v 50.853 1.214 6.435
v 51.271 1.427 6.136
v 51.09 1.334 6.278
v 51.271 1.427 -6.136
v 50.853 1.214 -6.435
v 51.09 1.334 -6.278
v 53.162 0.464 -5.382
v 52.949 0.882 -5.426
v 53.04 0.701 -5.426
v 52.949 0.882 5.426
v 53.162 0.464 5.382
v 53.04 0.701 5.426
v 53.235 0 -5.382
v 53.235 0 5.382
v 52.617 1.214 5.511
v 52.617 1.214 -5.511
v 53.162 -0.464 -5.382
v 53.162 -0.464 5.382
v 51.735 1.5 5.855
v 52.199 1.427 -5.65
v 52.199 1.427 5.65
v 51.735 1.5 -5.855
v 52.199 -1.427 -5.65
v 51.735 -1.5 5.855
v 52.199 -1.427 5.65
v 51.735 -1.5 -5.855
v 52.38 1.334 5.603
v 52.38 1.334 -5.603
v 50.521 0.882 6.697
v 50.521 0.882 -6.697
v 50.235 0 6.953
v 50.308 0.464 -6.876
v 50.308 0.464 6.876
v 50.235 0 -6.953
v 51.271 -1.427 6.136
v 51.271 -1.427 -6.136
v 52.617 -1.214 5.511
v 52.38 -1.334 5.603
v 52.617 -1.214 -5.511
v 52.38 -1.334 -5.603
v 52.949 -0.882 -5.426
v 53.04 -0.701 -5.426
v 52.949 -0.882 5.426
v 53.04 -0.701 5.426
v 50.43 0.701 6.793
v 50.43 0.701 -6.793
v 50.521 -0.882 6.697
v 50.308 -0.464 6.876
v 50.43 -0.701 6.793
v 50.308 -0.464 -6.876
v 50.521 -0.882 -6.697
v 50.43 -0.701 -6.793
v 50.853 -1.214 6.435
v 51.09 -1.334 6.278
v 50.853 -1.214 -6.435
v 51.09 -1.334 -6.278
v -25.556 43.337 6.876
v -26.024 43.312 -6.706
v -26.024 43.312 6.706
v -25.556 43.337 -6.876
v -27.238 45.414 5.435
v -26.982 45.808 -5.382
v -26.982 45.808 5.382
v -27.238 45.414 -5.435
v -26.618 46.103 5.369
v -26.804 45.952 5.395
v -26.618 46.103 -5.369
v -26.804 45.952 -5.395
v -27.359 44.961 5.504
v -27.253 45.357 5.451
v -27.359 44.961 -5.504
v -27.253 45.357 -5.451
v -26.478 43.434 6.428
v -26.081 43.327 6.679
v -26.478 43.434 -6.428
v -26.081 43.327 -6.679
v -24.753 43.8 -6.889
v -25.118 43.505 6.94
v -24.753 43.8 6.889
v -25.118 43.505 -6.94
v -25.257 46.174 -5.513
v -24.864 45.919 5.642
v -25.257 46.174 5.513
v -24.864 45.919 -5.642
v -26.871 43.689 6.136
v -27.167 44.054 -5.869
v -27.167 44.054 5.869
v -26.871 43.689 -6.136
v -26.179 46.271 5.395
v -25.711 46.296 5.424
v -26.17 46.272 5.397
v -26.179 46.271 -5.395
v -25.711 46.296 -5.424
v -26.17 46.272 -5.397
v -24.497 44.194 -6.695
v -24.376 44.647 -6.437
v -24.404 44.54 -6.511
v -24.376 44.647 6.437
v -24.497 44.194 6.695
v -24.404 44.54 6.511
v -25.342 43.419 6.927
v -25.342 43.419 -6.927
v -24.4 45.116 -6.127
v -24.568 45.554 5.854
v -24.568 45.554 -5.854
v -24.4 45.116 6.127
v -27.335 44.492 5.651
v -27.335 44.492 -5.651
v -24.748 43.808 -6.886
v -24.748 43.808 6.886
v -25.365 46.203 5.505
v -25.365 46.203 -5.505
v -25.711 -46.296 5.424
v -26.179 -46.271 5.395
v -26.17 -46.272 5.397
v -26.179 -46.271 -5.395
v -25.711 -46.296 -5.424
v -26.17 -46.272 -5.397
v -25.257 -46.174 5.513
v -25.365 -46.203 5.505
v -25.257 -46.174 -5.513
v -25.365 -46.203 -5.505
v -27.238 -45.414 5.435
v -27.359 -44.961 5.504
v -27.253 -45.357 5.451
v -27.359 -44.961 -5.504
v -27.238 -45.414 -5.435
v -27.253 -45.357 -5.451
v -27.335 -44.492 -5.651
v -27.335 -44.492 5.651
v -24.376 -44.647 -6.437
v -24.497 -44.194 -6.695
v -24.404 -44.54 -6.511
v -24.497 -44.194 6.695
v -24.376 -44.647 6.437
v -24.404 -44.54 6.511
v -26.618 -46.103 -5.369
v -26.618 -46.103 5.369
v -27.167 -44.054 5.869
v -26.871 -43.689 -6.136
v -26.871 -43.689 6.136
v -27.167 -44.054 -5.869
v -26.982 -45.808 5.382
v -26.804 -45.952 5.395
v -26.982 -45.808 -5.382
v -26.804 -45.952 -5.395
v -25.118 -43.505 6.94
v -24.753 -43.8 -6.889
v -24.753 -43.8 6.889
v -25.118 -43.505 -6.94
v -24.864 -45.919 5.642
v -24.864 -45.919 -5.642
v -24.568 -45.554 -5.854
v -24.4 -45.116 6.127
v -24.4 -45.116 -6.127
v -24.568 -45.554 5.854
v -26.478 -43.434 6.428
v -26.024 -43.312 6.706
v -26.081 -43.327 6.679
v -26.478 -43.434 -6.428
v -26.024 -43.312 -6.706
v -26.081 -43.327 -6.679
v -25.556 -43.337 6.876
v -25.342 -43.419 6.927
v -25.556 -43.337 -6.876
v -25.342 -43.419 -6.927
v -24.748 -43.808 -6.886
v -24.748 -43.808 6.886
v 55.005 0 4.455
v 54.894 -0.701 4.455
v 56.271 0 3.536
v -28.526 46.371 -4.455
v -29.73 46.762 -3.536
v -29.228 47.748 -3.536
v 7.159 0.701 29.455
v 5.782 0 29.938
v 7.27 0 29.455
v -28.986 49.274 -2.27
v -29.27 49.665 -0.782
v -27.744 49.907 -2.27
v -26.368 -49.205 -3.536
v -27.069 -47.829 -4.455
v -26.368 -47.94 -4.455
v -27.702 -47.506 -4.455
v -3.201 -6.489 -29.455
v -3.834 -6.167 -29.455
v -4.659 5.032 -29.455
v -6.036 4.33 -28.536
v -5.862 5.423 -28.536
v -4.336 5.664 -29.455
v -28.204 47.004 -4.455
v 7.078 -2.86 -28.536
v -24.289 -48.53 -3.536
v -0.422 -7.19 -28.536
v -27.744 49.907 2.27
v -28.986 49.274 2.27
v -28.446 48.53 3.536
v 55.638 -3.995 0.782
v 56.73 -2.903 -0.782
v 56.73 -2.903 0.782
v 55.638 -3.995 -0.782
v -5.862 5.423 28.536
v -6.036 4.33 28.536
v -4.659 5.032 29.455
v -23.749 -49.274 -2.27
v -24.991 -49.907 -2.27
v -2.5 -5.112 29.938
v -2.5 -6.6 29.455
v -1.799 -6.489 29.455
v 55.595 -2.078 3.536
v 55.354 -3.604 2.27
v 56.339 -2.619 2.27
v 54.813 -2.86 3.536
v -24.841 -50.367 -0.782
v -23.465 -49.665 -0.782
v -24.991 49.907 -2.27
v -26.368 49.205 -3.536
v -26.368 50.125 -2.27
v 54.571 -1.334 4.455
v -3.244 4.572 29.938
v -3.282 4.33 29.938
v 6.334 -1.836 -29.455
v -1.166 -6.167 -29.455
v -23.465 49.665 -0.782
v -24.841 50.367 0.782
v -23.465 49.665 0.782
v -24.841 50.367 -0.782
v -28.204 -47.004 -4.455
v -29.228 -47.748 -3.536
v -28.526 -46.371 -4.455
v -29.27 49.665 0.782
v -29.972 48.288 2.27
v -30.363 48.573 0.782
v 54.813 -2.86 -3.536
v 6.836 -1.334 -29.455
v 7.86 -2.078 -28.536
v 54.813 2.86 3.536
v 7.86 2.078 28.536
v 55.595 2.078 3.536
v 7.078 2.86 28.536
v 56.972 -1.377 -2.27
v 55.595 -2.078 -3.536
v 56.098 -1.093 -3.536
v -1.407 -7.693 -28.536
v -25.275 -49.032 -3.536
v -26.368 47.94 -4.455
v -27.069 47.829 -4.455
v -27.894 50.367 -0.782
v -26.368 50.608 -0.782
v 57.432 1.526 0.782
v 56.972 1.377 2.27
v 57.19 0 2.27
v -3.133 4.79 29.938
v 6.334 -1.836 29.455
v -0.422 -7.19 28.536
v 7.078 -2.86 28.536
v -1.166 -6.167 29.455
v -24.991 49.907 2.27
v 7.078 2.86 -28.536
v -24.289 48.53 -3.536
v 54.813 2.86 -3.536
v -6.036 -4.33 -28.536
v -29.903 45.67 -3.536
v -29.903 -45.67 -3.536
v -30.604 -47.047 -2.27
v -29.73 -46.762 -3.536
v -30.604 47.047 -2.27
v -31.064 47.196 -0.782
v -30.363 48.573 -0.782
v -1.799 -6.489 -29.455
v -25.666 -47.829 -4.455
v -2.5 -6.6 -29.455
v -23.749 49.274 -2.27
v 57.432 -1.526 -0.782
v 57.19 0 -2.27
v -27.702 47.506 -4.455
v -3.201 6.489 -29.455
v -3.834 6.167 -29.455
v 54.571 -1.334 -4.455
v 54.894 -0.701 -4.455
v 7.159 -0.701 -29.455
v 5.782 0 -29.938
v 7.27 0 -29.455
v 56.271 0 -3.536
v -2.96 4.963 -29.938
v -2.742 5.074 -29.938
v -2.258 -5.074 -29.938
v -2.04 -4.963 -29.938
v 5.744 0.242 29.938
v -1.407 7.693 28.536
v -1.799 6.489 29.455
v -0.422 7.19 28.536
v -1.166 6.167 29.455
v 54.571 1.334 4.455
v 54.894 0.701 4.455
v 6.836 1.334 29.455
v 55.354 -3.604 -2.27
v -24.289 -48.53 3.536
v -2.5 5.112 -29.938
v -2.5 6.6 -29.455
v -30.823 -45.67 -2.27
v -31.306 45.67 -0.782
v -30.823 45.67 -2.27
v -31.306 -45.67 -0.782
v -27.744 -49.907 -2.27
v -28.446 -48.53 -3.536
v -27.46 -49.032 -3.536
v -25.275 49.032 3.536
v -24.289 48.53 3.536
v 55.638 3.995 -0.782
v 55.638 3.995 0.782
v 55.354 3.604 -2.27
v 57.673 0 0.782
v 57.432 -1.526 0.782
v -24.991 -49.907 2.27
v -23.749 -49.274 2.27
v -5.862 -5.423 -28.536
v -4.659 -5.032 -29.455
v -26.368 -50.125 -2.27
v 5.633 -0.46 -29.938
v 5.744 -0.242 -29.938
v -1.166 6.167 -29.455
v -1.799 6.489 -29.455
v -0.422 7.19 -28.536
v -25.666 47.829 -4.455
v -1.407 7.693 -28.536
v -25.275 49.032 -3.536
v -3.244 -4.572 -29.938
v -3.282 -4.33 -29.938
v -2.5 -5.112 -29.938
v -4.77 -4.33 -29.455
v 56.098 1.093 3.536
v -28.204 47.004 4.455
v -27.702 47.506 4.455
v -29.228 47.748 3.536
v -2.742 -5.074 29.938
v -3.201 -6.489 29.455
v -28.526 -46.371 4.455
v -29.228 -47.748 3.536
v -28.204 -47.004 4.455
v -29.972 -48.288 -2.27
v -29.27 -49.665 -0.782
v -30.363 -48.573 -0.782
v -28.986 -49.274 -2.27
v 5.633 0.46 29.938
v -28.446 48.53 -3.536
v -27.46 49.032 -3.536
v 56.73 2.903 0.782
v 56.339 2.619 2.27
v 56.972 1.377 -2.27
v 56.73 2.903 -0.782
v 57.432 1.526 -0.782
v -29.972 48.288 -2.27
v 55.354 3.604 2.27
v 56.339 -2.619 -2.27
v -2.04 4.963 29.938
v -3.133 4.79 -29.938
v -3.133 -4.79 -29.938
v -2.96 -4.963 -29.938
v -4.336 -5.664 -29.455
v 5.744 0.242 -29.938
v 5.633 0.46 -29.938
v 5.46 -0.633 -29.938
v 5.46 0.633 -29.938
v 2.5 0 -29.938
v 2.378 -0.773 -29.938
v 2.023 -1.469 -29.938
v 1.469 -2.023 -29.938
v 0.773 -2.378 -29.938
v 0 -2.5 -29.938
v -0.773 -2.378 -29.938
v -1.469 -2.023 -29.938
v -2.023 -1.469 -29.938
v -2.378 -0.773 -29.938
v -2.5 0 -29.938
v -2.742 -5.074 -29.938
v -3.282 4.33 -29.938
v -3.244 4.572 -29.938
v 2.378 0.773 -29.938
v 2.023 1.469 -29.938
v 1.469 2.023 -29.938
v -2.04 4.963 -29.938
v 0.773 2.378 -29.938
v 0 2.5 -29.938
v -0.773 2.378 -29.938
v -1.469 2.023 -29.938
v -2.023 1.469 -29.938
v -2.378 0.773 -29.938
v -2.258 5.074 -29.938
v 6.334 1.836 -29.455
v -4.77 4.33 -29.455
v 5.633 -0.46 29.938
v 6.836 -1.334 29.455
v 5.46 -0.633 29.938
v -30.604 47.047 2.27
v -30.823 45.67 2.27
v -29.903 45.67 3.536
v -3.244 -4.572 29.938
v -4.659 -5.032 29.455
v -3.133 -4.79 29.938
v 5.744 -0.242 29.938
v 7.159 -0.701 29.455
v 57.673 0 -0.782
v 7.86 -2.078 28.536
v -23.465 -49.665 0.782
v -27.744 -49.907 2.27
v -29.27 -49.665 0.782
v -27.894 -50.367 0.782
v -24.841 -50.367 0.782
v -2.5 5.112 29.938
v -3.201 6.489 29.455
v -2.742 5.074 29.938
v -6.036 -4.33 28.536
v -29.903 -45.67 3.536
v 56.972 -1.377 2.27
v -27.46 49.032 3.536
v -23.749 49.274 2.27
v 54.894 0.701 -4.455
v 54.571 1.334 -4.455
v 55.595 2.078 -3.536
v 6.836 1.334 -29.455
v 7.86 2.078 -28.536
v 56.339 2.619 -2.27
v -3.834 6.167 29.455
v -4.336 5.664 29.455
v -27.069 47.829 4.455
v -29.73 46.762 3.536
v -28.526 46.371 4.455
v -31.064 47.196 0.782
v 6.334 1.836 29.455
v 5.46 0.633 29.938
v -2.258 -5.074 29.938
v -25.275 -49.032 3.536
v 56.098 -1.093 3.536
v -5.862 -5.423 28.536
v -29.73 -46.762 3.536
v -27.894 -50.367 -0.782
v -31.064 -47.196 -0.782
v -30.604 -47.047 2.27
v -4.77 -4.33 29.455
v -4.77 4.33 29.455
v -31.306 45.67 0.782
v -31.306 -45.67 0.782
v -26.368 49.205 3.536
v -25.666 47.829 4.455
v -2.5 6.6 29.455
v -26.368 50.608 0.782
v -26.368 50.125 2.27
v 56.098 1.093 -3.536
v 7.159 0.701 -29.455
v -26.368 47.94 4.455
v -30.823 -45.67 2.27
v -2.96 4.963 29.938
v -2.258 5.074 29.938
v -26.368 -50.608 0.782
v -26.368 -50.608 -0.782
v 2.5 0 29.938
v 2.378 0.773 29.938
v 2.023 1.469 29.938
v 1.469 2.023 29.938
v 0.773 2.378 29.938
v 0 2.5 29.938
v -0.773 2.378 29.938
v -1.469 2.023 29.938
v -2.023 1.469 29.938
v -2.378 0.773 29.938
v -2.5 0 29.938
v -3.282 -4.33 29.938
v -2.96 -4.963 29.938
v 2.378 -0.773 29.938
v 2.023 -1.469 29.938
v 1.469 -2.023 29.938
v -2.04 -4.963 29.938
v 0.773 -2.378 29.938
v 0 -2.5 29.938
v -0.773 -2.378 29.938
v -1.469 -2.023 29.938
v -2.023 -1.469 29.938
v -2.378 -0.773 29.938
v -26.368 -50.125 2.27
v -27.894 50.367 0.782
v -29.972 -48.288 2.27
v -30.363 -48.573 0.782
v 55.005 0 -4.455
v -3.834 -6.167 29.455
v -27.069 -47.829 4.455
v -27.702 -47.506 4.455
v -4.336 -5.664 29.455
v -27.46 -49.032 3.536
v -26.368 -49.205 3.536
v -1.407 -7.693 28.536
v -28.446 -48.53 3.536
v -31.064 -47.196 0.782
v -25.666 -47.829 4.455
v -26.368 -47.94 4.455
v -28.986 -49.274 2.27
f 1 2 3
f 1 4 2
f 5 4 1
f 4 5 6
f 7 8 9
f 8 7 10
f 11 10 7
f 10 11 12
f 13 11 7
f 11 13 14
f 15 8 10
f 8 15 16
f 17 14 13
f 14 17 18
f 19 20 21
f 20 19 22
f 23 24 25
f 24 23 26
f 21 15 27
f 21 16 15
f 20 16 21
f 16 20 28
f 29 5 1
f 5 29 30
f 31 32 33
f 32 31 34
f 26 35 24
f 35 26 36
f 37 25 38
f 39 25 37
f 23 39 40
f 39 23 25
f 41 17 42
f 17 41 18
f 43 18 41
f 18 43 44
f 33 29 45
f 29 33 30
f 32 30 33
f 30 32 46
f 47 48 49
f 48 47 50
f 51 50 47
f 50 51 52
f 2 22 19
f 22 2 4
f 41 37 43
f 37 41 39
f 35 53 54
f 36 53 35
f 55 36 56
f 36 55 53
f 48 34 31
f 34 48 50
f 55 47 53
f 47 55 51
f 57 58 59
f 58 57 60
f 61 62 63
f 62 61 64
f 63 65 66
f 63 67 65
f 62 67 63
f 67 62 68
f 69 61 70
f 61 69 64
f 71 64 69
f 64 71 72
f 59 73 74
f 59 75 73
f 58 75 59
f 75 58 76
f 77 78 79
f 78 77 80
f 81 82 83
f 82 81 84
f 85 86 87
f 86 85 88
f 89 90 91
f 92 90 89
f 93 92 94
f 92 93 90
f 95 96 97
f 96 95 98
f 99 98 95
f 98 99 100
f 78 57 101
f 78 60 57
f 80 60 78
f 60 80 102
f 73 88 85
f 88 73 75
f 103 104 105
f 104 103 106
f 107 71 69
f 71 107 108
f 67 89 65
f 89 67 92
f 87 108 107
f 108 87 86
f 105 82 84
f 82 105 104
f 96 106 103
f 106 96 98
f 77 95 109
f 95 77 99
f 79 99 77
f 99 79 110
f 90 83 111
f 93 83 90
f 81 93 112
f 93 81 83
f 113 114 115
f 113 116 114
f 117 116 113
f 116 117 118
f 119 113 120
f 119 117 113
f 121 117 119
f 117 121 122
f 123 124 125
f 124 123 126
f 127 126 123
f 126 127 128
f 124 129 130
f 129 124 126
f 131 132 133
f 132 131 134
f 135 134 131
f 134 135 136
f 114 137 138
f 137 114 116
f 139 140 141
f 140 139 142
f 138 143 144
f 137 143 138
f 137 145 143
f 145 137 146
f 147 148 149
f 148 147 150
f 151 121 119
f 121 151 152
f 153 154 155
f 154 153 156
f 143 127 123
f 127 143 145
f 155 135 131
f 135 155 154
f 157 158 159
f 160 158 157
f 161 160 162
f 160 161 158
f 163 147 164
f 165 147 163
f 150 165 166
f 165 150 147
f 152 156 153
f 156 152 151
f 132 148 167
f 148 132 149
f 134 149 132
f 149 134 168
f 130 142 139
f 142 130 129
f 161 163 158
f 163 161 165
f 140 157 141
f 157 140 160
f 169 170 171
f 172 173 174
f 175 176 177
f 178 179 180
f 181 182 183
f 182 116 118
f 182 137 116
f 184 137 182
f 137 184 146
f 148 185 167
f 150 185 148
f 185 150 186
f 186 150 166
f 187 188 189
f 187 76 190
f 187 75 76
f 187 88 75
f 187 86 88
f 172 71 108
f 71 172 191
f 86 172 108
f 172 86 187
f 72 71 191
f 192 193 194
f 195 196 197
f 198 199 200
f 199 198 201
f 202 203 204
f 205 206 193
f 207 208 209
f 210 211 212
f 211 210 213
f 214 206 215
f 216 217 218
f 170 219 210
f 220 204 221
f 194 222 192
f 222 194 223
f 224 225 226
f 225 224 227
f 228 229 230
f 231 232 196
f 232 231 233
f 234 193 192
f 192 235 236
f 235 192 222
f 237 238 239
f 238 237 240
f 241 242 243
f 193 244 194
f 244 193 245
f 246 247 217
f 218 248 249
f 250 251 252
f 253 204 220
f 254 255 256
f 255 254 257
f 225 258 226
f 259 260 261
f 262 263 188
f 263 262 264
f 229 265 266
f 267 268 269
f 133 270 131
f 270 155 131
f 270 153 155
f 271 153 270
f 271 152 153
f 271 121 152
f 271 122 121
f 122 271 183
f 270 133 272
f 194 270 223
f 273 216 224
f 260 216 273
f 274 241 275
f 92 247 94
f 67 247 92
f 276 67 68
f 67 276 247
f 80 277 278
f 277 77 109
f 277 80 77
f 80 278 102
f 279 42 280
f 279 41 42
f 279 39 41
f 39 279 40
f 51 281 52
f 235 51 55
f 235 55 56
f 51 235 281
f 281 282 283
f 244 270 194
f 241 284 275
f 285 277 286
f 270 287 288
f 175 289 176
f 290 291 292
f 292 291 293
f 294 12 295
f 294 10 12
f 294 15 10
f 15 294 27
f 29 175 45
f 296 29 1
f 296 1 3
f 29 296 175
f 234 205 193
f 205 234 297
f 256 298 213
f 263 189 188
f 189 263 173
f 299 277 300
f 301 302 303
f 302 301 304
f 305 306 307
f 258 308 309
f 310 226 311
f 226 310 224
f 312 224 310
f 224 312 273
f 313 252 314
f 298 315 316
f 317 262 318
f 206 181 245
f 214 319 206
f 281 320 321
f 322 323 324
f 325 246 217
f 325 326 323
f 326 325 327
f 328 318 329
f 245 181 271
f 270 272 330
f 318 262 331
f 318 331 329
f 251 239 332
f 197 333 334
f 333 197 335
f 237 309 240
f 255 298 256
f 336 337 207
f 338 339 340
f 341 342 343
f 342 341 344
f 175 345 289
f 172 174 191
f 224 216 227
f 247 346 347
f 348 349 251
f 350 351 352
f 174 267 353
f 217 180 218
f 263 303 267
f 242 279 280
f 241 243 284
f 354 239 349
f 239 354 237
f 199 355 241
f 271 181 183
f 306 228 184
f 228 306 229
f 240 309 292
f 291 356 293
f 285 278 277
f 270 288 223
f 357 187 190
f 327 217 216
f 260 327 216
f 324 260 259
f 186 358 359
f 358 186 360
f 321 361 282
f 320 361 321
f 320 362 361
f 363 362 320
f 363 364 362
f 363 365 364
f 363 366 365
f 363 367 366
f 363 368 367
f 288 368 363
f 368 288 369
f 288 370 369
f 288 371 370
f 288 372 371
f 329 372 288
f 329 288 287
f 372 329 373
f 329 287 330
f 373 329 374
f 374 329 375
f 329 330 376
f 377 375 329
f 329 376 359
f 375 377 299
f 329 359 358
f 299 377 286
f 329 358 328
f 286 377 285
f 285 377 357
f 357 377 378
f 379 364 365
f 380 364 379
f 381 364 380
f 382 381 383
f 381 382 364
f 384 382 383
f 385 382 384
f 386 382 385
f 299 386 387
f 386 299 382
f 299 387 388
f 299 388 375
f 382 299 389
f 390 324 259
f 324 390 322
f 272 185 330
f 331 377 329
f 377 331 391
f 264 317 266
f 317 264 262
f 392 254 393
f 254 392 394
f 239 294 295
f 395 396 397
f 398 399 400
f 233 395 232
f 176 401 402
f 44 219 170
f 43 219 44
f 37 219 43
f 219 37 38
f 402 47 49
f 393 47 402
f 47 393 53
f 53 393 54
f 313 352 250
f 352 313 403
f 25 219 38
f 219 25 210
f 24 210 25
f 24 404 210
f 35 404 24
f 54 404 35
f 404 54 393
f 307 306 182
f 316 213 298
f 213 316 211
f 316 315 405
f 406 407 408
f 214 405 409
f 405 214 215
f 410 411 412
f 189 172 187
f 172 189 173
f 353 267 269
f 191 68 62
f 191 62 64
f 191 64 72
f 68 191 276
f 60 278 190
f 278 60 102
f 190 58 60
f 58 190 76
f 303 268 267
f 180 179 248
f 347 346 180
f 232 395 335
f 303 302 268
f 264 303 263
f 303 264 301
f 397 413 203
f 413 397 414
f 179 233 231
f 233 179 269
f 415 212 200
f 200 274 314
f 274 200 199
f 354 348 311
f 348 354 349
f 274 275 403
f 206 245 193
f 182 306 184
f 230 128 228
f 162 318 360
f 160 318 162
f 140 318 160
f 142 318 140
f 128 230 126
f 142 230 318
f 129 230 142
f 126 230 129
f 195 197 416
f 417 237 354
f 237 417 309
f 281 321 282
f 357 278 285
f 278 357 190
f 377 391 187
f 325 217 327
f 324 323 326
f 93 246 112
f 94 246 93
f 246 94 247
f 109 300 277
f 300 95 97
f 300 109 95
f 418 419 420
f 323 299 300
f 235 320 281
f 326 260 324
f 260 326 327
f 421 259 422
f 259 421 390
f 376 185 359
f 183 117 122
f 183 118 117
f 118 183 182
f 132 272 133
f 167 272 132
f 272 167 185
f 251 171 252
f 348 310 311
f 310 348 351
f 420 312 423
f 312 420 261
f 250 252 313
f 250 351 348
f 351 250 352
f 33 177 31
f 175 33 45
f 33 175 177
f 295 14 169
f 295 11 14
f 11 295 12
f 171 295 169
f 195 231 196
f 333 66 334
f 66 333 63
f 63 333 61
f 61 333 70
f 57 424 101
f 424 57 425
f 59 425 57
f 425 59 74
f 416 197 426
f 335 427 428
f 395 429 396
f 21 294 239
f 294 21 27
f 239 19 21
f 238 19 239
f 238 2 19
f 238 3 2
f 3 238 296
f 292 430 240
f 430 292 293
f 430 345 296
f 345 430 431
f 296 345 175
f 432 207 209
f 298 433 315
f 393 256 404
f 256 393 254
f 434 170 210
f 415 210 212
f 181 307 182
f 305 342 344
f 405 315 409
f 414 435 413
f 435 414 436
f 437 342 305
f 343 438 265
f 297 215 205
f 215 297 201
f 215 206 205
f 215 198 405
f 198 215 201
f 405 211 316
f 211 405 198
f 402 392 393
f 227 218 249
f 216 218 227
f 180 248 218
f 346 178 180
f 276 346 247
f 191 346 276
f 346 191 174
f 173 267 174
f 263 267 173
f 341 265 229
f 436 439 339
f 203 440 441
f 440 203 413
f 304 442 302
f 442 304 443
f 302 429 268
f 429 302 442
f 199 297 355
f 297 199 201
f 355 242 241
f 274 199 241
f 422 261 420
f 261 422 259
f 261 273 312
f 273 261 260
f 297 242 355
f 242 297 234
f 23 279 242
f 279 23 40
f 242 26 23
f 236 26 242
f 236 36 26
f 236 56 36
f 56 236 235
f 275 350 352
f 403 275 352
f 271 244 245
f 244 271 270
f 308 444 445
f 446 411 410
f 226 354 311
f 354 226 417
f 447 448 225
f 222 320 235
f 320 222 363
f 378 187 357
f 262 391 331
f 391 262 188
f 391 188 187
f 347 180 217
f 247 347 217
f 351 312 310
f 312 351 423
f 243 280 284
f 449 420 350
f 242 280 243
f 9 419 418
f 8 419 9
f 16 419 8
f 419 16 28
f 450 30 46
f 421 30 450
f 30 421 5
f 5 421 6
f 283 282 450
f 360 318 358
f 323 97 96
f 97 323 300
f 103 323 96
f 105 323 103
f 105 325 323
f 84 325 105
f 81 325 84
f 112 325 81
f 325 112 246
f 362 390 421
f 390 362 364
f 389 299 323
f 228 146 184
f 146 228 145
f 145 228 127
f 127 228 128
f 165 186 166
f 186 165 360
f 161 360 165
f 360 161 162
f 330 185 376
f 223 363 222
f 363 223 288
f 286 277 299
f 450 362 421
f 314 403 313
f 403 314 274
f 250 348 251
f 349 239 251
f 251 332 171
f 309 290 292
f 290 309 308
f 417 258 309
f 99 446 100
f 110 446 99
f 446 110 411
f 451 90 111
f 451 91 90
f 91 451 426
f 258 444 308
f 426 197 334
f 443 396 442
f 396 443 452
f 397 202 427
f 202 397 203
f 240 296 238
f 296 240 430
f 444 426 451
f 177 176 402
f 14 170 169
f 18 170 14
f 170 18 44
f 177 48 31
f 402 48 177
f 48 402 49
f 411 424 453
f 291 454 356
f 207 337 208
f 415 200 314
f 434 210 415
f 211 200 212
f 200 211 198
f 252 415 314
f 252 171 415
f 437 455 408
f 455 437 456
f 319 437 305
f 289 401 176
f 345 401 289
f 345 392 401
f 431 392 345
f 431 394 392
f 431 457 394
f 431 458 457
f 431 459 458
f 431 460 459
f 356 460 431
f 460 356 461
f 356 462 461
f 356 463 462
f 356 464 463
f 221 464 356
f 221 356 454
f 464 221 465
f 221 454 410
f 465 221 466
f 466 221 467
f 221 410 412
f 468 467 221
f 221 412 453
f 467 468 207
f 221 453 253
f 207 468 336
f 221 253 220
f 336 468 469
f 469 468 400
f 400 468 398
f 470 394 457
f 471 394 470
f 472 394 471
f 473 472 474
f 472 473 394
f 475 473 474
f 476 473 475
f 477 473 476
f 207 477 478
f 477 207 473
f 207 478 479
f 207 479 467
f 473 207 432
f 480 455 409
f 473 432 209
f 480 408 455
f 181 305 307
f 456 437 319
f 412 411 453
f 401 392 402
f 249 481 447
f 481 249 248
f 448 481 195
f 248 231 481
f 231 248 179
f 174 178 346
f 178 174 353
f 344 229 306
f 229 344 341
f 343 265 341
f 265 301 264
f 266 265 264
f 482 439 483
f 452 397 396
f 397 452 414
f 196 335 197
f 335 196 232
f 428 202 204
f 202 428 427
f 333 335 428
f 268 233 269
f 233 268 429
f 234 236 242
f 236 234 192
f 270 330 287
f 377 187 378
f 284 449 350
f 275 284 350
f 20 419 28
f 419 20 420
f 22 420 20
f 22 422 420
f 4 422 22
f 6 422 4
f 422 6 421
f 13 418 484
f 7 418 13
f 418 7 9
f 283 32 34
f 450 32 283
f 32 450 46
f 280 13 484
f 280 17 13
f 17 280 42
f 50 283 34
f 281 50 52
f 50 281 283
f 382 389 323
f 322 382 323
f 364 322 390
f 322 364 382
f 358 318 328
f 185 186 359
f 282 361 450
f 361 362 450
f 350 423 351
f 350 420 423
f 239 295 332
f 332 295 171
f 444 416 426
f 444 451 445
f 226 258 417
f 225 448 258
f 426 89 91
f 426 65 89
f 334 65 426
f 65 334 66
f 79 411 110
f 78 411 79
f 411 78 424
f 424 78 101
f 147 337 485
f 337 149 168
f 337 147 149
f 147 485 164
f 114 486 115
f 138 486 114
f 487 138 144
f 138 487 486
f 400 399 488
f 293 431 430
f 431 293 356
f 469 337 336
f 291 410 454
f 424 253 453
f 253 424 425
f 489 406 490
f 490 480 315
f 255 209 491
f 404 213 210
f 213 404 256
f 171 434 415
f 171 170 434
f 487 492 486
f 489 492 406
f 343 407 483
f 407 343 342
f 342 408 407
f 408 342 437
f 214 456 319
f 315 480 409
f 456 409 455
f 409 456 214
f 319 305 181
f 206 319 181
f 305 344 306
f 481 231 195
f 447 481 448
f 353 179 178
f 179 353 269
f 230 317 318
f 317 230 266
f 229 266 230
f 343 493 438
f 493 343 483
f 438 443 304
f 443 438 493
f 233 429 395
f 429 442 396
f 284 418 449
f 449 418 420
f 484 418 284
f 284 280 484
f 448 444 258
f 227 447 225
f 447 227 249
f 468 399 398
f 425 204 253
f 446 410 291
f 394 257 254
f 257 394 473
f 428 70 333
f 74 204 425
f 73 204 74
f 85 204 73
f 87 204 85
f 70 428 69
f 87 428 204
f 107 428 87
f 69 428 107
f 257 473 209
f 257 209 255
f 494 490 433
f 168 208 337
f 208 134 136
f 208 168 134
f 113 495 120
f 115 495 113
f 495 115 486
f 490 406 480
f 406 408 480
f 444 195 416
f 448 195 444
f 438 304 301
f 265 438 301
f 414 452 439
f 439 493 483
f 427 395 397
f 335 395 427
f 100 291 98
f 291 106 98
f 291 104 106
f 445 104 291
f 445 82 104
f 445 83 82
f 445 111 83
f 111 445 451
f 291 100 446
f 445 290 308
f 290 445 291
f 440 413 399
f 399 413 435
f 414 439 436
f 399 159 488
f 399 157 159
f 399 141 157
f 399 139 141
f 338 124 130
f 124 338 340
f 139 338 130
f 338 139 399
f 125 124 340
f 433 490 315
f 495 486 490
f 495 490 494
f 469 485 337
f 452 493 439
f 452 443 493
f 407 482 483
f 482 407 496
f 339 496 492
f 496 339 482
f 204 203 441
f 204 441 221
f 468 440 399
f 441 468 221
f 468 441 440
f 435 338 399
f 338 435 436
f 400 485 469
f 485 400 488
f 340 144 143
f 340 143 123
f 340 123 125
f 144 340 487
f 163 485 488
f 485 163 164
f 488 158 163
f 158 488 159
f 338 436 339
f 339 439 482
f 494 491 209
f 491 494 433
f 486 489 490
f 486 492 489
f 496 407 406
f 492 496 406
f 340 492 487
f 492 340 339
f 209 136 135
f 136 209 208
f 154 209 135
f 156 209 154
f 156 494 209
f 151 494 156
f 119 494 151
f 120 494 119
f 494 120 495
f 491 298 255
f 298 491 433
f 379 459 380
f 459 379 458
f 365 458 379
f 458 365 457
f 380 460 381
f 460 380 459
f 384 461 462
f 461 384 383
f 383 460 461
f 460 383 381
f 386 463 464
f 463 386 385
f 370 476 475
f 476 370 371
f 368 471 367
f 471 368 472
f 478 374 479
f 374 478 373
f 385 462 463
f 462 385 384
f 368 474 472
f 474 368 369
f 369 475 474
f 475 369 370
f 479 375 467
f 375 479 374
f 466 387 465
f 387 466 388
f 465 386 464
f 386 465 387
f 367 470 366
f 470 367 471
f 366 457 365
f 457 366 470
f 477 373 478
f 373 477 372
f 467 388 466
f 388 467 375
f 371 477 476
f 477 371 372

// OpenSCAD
// export_segment.scad
// Run via CLI to batch export centered individual segments

i = 0; // Default index overridden by CLI

num_sections = 20;
base_side = 100;
base_top_h = 30;
base_bot_h = 30;
base_top_face = 10;
base_bot_face = 10;
base_fillet = 5.0;

spine_radius = 2.5; 
cable_radius = 1.5; 

function get_scale(idx) = 1.0 - (idx * (0.65 / (num_sections - 1)));

module single_segment(idx) {
    s = get_scale(idx);
    
    c_side = base_side * s;
    c_top_h = base_top_h * s;
    c_bot_h = base_bot_h * s;
    c_top_face = base_top_face * s;
    c_bot_face = base_bot_face * s;
    c_fillet = base_fillet * s;
    
    radius = c_side / sqrt(3); 
    core_radius = max(0.1, radius - c_fillet); 
    core_top = max(0.1, c_top_face - c_fillet);
    core_bot = max(0.1, c_bot_face - c_fillet);

    difference() {
        minkowski() {
            union() {
                cylinder(h=c_top_h - c_fillet, r1=core_radius, r2=core_top, $fn=3);
                rotate([180, 0, 0])
                cylinder(h=c_bot_h - c_fillet, r1=core_radius, r2=core_bot, $fn=3);
            }
            sphere(r=c_fillet, $fn=20);
        }
        
        translate([0, 0, -c_bot_h - 10])
        cylinder(h=c_top_h + c_bot_h + 20, r=spine_radius, $fn=20);
        
        cable_offset = max(spine_radius + cable_radius + 1.0, radius - (cable_radius * 4));
        
        for(angle = [0, 120, 240]) {
            rotate([0, 0, angle])
            translate([cable_offset, 0, -c_bot_h - 10])
            cylinder(h=c_top_h + c_bot_h + 20, r=cable_radius, $fn=20);
        }
    }
}

// Renders the single targeted segment
single_segment(i);
